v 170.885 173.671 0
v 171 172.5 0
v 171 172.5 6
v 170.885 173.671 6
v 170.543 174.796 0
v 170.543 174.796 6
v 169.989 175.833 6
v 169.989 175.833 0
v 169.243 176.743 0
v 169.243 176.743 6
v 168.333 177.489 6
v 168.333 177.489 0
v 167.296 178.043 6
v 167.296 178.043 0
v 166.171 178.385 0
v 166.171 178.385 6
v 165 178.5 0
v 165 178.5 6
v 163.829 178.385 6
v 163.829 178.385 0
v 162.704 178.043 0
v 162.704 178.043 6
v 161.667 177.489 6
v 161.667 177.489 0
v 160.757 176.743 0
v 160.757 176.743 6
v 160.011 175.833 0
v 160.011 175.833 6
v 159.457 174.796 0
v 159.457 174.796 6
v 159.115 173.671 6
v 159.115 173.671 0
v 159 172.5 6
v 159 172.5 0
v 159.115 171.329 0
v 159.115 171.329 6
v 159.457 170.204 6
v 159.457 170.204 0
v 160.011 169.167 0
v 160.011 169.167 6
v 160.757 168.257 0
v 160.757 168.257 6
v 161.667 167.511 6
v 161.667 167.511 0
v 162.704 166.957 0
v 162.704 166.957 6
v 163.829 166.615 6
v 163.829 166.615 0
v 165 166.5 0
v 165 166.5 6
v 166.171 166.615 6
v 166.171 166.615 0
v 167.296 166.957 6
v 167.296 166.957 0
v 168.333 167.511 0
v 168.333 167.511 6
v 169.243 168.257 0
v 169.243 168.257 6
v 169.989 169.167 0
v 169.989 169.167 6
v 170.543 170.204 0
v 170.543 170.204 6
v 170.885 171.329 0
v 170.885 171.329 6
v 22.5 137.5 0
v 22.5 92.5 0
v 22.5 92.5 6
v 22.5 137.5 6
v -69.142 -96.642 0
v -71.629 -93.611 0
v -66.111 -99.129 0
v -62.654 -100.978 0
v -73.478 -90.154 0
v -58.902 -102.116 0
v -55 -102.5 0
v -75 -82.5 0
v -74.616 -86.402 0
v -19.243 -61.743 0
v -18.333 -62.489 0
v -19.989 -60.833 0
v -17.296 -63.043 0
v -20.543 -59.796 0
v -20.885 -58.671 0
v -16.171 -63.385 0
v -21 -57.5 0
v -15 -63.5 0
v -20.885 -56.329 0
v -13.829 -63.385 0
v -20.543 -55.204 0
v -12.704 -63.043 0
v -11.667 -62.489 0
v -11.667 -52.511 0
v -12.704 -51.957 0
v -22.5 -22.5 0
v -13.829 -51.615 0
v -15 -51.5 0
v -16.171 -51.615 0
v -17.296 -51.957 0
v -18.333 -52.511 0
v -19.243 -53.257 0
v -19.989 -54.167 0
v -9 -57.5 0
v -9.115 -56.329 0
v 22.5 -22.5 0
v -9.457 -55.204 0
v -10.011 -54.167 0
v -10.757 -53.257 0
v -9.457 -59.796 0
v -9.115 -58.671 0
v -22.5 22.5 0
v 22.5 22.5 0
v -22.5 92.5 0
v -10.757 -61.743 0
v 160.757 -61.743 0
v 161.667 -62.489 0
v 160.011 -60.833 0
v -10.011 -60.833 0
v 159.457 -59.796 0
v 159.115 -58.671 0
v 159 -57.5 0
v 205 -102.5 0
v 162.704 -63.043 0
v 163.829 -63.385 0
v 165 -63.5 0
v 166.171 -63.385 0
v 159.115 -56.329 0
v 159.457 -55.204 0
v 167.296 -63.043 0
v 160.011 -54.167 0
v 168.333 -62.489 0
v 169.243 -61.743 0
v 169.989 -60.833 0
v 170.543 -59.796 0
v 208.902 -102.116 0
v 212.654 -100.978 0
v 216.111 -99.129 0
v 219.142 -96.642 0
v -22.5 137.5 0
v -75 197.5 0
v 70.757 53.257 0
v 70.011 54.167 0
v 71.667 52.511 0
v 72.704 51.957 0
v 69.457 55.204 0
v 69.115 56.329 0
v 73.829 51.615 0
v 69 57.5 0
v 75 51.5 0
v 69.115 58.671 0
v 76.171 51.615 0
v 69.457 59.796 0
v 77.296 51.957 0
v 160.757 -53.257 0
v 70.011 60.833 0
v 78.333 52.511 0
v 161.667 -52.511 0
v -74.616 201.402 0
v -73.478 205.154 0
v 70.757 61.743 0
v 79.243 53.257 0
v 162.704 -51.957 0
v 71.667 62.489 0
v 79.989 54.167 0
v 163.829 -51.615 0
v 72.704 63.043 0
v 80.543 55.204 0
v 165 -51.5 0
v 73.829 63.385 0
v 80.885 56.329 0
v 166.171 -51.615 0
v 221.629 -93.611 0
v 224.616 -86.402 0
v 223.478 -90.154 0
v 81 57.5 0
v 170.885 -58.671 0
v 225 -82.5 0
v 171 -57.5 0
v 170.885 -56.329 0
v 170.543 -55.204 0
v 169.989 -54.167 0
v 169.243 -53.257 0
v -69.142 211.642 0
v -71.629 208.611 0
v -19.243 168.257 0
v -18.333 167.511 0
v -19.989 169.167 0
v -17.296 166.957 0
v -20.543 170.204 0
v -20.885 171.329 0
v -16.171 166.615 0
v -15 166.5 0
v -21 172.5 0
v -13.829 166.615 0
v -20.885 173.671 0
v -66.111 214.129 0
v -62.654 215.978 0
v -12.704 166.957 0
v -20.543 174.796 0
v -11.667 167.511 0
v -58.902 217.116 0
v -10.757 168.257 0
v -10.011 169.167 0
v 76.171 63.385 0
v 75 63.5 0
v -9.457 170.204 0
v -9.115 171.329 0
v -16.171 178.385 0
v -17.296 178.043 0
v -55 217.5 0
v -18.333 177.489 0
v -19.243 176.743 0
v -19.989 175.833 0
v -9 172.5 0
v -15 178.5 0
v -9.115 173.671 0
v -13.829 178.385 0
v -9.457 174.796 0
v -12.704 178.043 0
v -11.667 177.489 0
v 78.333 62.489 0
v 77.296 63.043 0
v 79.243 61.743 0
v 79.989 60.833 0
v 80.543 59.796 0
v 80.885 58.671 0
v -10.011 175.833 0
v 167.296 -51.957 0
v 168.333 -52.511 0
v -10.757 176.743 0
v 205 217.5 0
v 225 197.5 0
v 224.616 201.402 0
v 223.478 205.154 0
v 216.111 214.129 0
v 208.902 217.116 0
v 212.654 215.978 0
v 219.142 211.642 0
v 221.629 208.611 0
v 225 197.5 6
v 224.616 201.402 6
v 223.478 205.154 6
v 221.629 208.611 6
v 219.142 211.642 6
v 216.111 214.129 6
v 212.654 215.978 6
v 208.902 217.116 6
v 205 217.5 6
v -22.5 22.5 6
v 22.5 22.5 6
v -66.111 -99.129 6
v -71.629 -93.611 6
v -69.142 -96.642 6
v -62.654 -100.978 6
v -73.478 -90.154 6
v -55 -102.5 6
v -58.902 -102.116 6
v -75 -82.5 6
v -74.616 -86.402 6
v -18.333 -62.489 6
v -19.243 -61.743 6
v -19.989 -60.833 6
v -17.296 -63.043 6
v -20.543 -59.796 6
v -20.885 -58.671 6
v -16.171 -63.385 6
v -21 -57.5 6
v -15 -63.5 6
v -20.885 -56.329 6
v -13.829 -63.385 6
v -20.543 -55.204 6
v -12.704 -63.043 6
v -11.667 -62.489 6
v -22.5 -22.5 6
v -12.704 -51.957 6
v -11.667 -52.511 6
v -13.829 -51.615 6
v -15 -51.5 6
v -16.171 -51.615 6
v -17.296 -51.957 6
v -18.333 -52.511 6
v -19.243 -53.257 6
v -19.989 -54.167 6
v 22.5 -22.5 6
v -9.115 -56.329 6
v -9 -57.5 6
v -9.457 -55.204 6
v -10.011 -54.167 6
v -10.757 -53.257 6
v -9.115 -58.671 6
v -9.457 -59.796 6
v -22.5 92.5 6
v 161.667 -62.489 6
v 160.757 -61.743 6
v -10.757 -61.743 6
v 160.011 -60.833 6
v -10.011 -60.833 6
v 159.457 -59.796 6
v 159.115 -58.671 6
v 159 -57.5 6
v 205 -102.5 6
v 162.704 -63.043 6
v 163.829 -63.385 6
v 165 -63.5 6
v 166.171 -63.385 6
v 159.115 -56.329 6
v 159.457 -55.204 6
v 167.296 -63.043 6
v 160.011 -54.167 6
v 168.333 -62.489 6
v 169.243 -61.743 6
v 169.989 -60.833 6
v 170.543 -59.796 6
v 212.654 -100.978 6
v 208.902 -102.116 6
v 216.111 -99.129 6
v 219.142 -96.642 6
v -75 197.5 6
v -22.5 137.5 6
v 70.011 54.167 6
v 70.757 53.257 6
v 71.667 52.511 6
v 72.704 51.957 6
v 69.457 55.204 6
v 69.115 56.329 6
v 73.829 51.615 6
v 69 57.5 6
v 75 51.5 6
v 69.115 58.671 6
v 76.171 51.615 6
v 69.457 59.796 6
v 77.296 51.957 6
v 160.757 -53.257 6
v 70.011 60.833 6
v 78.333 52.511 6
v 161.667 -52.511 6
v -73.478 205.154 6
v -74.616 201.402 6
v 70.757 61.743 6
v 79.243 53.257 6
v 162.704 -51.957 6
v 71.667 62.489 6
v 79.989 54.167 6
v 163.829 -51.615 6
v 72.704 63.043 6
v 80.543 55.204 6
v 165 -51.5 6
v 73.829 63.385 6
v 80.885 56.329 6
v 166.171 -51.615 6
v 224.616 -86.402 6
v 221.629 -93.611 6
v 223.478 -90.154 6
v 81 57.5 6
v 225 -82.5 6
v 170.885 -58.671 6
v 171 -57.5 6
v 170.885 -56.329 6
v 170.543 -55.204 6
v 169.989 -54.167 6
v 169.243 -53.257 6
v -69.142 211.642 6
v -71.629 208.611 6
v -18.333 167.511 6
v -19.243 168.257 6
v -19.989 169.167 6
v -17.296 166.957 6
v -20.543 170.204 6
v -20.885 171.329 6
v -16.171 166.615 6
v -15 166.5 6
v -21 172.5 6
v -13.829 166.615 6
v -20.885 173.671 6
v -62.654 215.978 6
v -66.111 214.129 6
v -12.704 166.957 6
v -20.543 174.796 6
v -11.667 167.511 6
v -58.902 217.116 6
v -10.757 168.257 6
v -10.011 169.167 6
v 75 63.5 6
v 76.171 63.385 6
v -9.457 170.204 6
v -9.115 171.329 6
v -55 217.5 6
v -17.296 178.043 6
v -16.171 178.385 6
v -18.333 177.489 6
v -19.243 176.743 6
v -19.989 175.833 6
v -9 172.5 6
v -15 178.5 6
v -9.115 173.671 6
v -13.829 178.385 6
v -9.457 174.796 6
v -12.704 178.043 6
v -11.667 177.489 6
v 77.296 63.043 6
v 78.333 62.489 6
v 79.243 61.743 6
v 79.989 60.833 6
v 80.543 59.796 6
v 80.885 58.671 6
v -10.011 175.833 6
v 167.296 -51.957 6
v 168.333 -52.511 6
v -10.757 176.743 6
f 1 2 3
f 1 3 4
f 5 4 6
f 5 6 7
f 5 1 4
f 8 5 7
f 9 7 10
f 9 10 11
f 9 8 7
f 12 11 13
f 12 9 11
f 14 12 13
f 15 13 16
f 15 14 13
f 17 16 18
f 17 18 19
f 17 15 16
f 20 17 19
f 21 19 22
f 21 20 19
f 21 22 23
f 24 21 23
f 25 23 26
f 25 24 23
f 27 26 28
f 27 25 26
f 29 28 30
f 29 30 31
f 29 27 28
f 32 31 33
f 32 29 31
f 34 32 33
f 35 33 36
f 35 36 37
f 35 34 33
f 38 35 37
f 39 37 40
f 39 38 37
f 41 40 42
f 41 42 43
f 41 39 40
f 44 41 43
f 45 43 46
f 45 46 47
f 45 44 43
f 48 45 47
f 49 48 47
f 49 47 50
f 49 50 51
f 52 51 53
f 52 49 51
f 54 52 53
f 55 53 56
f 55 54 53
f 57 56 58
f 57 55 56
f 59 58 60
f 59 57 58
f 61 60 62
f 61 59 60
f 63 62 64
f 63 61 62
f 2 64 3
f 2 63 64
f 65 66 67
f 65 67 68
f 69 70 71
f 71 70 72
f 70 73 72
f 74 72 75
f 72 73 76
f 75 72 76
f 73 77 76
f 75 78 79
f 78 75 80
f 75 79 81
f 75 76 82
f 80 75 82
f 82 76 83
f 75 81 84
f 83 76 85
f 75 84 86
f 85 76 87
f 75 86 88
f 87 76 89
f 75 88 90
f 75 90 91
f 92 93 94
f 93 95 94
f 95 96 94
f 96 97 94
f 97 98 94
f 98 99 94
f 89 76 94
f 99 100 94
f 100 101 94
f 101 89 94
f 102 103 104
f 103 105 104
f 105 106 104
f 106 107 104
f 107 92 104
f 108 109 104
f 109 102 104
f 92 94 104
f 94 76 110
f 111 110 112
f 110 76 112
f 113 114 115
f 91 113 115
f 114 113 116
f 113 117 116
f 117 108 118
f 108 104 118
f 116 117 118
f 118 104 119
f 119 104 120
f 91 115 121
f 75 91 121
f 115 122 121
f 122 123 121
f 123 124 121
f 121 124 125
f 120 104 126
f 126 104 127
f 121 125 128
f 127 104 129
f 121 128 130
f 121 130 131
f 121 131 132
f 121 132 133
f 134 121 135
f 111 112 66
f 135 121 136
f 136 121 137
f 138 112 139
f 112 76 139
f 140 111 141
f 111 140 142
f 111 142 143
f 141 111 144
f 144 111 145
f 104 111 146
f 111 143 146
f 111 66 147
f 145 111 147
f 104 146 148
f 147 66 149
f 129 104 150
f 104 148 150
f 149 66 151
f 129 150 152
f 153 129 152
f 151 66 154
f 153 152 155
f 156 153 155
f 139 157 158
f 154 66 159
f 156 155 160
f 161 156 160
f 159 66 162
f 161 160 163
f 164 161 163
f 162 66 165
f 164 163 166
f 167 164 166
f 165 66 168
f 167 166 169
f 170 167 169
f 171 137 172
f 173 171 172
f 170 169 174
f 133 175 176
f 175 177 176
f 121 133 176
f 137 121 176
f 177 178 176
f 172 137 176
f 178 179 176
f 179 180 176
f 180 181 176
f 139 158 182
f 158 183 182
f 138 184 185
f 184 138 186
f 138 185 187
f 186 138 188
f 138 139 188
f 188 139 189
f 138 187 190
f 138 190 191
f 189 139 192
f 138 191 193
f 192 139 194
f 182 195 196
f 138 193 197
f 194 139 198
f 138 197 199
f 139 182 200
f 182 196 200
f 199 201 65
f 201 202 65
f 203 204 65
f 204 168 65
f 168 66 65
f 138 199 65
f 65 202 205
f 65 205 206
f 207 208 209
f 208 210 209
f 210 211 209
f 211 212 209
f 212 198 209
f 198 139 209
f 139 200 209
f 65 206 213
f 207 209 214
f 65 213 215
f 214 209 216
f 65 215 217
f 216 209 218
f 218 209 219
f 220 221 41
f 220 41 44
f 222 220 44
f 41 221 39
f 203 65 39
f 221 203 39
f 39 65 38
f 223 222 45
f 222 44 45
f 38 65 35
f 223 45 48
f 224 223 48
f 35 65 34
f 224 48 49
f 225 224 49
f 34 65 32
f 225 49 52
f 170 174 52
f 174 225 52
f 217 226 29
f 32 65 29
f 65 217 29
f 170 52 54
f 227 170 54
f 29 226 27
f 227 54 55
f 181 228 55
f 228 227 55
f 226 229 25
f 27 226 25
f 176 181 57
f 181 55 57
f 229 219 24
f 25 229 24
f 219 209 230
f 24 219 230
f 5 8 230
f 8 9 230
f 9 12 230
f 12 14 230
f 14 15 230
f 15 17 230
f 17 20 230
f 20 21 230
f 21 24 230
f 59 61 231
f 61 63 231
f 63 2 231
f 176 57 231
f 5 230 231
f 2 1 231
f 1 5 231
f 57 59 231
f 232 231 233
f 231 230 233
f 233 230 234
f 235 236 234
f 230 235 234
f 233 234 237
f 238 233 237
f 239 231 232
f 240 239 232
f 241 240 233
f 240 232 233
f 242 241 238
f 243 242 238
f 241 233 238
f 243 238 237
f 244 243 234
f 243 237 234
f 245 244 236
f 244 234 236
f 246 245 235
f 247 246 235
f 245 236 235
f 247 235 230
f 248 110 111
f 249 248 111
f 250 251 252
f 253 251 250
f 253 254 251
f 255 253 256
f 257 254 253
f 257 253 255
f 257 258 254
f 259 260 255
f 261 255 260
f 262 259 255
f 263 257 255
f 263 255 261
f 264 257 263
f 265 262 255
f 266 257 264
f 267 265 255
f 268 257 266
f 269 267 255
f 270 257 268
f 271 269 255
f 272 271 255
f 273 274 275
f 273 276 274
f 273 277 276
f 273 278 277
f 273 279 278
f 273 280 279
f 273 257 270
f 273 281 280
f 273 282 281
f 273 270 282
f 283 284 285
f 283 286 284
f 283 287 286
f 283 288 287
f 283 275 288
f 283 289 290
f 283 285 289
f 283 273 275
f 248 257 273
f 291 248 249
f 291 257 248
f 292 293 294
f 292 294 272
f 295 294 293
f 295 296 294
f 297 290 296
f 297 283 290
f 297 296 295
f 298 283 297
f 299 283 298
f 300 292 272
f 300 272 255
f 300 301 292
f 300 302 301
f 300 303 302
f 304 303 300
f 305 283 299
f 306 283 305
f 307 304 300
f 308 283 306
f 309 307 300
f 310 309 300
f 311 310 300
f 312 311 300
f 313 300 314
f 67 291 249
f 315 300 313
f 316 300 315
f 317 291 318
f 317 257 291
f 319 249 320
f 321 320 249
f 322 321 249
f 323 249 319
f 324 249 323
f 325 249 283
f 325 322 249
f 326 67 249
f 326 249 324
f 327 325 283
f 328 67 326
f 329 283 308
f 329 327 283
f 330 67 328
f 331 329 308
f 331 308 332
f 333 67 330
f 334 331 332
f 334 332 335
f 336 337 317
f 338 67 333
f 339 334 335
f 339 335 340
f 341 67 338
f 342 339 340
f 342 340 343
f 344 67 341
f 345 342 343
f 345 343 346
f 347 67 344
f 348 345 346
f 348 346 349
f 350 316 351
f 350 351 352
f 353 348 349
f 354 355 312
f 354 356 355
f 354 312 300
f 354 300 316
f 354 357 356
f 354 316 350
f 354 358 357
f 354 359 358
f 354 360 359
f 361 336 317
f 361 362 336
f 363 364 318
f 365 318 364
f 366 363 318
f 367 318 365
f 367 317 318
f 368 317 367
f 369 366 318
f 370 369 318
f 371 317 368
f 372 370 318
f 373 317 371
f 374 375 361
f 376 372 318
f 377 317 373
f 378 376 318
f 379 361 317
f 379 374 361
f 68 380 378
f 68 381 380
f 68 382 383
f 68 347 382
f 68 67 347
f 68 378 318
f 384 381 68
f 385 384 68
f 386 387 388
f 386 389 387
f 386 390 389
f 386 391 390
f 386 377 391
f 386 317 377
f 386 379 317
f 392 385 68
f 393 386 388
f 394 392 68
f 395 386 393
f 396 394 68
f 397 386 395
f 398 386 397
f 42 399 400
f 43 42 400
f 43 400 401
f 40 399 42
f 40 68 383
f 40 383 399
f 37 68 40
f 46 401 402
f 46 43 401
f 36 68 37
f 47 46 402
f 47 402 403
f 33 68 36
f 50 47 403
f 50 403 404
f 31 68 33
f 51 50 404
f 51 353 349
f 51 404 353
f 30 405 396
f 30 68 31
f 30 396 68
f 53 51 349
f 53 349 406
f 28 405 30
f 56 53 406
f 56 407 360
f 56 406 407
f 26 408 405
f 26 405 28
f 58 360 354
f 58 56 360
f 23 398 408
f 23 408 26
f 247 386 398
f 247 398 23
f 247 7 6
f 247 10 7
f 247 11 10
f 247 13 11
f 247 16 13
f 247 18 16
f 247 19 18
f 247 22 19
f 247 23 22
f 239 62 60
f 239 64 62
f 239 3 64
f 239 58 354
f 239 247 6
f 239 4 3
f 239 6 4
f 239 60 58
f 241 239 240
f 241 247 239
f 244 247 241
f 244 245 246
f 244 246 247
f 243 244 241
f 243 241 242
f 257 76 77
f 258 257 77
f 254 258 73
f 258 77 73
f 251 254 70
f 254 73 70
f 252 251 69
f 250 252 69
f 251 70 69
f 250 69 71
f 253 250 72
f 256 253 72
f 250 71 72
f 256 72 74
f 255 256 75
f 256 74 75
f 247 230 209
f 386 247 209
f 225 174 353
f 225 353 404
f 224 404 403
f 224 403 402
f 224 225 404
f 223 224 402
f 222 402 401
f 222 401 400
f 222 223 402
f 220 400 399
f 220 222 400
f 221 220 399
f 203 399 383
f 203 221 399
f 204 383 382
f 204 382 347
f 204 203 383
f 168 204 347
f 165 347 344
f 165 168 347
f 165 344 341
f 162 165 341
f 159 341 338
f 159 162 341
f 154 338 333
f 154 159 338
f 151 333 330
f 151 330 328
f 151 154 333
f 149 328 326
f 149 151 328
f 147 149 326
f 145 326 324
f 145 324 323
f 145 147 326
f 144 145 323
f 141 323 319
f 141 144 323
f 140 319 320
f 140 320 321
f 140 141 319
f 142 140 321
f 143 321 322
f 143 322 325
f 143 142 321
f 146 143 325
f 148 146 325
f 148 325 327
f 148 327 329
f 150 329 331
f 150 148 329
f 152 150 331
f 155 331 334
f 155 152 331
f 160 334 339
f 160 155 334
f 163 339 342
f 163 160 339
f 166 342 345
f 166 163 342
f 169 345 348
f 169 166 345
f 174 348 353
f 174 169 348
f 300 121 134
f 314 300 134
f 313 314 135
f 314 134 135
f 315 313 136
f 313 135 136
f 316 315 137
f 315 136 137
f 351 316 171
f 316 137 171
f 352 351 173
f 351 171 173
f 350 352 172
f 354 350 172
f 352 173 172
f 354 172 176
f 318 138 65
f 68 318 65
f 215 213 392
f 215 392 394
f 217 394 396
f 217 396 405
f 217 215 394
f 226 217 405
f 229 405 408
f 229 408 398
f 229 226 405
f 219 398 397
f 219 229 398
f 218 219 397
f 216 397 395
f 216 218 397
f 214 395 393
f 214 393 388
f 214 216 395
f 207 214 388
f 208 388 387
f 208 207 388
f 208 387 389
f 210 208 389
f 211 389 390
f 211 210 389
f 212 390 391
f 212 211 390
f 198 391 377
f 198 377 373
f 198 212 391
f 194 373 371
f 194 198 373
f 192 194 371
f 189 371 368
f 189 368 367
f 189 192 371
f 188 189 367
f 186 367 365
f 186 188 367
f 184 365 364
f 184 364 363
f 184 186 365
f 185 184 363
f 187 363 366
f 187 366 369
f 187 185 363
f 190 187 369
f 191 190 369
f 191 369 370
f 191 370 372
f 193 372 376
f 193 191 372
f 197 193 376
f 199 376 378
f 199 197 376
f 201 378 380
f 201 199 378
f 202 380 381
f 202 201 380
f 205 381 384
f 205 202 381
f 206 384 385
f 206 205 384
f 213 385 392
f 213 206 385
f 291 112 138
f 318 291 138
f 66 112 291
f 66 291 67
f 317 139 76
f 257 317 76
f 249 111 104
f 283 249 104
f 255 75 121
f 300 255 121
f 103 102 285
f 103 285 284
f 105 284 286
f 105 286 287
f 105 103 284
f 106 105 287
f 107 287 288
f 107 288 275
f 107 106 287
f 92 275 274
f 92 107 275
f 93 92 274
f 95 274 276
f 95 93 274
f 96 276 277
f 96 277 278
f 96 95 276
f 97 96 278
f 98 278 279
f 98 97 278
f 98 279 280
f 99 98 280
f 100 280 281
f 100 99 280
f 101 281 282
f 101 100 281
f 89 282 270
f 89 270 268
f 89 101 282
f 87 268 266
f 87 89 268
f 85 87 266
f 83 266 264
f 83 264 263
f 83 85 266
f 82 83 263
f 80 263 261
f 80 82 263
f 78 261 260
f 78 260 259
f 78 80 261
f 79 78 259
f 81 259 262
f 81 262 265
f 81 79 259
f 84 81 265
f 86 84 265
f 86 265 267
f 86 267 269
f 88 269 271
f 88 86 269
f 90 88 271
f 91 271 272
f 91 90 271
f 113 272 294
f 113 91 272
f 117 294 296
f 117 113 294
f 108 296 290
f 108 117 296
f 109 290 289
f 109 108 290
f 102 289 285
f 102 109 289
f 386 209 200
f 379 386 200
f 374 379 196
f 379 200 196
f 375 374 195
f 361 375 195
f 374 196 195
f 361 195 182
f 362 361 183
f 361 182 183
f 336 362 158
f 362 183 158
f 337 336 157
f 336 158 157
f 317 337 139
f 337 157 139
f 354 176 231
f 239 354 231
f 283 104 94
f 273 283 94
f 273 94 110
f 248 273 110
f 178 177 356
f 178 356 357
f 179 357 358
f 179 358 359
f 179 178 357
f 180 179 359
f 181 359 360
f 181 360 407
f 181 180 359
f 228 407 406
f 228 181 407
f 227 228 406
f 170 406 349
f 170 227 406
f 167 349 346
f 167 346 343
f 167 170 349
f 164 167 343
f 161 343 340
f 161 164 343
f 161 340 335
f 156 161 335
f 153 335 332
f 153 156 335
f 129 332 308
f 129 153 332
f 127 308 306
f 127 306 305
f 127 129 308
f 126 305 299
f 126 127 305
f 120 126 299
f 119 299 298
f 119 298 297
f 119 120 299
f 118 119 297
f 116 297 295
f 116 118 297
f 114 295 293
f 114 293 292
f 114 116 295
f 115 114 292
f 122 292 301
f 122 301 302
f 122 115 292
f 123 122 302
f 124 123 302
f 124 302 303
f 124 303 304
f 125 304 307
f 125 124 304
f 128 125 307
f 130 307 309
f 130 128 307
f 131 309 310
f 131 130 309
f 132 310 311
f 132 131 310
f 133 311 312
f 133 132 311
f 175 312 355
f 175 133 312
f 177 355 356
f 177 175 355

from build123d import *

# Parameters (mm, degrees)
SKETCH1_R           = 6
SKETCH1_W           = 45
SKETCH1_H           = 45
BOSS_EXTRUDE1_DEPTH = 6


with BuildPart() as part:
    # Sketch1 → Boss-Extrude1 (new body)
    with BuildSketch(Plane.XY):
        with BuildLine():
            Line((-55, -102.5), (205, -102.5))
            ThreePointArc((205, -102.5), (219.142135624, -96.642135624), (225, -82.5))
            Line((225, -82.5), (225, 197.5))
            ThreePointArc((225, 197.5), (219.142135624, 211.642135624), (205, 217.5))
            Line((205, 217.5), (-55, 217.5))
            ThreePointArc((-55, 217.5), (-69.142135624, 211.642135624), (-75, 197.5))
            Line((-75, 197.5), (-75, -82.5))
            ThreePointArc((-75, -82.5), (-69.142135624, -96.642135624), (-55, -102.5))
        make_face()
        with Locations((165, 172.5)):
            Circle(SKETCH1_R, mode=Mode.SUBTRACT)
        with Locations((-15, -57.5)):
            Circle(SKETCH1_R, mode=Mode.SUBTRACT)
        Polygon((22.5, -22.5), (-22.5, -22.5), (-22.5, 22.5), (0, 22.5), (22.5, 22.5), align=None, mode=Mode.SUBTRACT)
        with Locations((165, -57.5)):
            Circle(SKETCH1_R, mode=Mode.SUBTRACT)
        with Locations((0, 115)):
            Rectangle(SKETCH1_W, SKETCH1_H, mode=Mode.SUBTRACT)
        with Locations((-15, 172.5)):
            Circle(SKETCH1_R, mode=Mode.SUBTRACT)
        with Locations((75, 57.5)):
            Circle(SKETCH1_R, mode=Mode.SUBTRACT)
    extrude(amount=BOSS_EXTRUDE1_DEPTH)


solid = part.part
